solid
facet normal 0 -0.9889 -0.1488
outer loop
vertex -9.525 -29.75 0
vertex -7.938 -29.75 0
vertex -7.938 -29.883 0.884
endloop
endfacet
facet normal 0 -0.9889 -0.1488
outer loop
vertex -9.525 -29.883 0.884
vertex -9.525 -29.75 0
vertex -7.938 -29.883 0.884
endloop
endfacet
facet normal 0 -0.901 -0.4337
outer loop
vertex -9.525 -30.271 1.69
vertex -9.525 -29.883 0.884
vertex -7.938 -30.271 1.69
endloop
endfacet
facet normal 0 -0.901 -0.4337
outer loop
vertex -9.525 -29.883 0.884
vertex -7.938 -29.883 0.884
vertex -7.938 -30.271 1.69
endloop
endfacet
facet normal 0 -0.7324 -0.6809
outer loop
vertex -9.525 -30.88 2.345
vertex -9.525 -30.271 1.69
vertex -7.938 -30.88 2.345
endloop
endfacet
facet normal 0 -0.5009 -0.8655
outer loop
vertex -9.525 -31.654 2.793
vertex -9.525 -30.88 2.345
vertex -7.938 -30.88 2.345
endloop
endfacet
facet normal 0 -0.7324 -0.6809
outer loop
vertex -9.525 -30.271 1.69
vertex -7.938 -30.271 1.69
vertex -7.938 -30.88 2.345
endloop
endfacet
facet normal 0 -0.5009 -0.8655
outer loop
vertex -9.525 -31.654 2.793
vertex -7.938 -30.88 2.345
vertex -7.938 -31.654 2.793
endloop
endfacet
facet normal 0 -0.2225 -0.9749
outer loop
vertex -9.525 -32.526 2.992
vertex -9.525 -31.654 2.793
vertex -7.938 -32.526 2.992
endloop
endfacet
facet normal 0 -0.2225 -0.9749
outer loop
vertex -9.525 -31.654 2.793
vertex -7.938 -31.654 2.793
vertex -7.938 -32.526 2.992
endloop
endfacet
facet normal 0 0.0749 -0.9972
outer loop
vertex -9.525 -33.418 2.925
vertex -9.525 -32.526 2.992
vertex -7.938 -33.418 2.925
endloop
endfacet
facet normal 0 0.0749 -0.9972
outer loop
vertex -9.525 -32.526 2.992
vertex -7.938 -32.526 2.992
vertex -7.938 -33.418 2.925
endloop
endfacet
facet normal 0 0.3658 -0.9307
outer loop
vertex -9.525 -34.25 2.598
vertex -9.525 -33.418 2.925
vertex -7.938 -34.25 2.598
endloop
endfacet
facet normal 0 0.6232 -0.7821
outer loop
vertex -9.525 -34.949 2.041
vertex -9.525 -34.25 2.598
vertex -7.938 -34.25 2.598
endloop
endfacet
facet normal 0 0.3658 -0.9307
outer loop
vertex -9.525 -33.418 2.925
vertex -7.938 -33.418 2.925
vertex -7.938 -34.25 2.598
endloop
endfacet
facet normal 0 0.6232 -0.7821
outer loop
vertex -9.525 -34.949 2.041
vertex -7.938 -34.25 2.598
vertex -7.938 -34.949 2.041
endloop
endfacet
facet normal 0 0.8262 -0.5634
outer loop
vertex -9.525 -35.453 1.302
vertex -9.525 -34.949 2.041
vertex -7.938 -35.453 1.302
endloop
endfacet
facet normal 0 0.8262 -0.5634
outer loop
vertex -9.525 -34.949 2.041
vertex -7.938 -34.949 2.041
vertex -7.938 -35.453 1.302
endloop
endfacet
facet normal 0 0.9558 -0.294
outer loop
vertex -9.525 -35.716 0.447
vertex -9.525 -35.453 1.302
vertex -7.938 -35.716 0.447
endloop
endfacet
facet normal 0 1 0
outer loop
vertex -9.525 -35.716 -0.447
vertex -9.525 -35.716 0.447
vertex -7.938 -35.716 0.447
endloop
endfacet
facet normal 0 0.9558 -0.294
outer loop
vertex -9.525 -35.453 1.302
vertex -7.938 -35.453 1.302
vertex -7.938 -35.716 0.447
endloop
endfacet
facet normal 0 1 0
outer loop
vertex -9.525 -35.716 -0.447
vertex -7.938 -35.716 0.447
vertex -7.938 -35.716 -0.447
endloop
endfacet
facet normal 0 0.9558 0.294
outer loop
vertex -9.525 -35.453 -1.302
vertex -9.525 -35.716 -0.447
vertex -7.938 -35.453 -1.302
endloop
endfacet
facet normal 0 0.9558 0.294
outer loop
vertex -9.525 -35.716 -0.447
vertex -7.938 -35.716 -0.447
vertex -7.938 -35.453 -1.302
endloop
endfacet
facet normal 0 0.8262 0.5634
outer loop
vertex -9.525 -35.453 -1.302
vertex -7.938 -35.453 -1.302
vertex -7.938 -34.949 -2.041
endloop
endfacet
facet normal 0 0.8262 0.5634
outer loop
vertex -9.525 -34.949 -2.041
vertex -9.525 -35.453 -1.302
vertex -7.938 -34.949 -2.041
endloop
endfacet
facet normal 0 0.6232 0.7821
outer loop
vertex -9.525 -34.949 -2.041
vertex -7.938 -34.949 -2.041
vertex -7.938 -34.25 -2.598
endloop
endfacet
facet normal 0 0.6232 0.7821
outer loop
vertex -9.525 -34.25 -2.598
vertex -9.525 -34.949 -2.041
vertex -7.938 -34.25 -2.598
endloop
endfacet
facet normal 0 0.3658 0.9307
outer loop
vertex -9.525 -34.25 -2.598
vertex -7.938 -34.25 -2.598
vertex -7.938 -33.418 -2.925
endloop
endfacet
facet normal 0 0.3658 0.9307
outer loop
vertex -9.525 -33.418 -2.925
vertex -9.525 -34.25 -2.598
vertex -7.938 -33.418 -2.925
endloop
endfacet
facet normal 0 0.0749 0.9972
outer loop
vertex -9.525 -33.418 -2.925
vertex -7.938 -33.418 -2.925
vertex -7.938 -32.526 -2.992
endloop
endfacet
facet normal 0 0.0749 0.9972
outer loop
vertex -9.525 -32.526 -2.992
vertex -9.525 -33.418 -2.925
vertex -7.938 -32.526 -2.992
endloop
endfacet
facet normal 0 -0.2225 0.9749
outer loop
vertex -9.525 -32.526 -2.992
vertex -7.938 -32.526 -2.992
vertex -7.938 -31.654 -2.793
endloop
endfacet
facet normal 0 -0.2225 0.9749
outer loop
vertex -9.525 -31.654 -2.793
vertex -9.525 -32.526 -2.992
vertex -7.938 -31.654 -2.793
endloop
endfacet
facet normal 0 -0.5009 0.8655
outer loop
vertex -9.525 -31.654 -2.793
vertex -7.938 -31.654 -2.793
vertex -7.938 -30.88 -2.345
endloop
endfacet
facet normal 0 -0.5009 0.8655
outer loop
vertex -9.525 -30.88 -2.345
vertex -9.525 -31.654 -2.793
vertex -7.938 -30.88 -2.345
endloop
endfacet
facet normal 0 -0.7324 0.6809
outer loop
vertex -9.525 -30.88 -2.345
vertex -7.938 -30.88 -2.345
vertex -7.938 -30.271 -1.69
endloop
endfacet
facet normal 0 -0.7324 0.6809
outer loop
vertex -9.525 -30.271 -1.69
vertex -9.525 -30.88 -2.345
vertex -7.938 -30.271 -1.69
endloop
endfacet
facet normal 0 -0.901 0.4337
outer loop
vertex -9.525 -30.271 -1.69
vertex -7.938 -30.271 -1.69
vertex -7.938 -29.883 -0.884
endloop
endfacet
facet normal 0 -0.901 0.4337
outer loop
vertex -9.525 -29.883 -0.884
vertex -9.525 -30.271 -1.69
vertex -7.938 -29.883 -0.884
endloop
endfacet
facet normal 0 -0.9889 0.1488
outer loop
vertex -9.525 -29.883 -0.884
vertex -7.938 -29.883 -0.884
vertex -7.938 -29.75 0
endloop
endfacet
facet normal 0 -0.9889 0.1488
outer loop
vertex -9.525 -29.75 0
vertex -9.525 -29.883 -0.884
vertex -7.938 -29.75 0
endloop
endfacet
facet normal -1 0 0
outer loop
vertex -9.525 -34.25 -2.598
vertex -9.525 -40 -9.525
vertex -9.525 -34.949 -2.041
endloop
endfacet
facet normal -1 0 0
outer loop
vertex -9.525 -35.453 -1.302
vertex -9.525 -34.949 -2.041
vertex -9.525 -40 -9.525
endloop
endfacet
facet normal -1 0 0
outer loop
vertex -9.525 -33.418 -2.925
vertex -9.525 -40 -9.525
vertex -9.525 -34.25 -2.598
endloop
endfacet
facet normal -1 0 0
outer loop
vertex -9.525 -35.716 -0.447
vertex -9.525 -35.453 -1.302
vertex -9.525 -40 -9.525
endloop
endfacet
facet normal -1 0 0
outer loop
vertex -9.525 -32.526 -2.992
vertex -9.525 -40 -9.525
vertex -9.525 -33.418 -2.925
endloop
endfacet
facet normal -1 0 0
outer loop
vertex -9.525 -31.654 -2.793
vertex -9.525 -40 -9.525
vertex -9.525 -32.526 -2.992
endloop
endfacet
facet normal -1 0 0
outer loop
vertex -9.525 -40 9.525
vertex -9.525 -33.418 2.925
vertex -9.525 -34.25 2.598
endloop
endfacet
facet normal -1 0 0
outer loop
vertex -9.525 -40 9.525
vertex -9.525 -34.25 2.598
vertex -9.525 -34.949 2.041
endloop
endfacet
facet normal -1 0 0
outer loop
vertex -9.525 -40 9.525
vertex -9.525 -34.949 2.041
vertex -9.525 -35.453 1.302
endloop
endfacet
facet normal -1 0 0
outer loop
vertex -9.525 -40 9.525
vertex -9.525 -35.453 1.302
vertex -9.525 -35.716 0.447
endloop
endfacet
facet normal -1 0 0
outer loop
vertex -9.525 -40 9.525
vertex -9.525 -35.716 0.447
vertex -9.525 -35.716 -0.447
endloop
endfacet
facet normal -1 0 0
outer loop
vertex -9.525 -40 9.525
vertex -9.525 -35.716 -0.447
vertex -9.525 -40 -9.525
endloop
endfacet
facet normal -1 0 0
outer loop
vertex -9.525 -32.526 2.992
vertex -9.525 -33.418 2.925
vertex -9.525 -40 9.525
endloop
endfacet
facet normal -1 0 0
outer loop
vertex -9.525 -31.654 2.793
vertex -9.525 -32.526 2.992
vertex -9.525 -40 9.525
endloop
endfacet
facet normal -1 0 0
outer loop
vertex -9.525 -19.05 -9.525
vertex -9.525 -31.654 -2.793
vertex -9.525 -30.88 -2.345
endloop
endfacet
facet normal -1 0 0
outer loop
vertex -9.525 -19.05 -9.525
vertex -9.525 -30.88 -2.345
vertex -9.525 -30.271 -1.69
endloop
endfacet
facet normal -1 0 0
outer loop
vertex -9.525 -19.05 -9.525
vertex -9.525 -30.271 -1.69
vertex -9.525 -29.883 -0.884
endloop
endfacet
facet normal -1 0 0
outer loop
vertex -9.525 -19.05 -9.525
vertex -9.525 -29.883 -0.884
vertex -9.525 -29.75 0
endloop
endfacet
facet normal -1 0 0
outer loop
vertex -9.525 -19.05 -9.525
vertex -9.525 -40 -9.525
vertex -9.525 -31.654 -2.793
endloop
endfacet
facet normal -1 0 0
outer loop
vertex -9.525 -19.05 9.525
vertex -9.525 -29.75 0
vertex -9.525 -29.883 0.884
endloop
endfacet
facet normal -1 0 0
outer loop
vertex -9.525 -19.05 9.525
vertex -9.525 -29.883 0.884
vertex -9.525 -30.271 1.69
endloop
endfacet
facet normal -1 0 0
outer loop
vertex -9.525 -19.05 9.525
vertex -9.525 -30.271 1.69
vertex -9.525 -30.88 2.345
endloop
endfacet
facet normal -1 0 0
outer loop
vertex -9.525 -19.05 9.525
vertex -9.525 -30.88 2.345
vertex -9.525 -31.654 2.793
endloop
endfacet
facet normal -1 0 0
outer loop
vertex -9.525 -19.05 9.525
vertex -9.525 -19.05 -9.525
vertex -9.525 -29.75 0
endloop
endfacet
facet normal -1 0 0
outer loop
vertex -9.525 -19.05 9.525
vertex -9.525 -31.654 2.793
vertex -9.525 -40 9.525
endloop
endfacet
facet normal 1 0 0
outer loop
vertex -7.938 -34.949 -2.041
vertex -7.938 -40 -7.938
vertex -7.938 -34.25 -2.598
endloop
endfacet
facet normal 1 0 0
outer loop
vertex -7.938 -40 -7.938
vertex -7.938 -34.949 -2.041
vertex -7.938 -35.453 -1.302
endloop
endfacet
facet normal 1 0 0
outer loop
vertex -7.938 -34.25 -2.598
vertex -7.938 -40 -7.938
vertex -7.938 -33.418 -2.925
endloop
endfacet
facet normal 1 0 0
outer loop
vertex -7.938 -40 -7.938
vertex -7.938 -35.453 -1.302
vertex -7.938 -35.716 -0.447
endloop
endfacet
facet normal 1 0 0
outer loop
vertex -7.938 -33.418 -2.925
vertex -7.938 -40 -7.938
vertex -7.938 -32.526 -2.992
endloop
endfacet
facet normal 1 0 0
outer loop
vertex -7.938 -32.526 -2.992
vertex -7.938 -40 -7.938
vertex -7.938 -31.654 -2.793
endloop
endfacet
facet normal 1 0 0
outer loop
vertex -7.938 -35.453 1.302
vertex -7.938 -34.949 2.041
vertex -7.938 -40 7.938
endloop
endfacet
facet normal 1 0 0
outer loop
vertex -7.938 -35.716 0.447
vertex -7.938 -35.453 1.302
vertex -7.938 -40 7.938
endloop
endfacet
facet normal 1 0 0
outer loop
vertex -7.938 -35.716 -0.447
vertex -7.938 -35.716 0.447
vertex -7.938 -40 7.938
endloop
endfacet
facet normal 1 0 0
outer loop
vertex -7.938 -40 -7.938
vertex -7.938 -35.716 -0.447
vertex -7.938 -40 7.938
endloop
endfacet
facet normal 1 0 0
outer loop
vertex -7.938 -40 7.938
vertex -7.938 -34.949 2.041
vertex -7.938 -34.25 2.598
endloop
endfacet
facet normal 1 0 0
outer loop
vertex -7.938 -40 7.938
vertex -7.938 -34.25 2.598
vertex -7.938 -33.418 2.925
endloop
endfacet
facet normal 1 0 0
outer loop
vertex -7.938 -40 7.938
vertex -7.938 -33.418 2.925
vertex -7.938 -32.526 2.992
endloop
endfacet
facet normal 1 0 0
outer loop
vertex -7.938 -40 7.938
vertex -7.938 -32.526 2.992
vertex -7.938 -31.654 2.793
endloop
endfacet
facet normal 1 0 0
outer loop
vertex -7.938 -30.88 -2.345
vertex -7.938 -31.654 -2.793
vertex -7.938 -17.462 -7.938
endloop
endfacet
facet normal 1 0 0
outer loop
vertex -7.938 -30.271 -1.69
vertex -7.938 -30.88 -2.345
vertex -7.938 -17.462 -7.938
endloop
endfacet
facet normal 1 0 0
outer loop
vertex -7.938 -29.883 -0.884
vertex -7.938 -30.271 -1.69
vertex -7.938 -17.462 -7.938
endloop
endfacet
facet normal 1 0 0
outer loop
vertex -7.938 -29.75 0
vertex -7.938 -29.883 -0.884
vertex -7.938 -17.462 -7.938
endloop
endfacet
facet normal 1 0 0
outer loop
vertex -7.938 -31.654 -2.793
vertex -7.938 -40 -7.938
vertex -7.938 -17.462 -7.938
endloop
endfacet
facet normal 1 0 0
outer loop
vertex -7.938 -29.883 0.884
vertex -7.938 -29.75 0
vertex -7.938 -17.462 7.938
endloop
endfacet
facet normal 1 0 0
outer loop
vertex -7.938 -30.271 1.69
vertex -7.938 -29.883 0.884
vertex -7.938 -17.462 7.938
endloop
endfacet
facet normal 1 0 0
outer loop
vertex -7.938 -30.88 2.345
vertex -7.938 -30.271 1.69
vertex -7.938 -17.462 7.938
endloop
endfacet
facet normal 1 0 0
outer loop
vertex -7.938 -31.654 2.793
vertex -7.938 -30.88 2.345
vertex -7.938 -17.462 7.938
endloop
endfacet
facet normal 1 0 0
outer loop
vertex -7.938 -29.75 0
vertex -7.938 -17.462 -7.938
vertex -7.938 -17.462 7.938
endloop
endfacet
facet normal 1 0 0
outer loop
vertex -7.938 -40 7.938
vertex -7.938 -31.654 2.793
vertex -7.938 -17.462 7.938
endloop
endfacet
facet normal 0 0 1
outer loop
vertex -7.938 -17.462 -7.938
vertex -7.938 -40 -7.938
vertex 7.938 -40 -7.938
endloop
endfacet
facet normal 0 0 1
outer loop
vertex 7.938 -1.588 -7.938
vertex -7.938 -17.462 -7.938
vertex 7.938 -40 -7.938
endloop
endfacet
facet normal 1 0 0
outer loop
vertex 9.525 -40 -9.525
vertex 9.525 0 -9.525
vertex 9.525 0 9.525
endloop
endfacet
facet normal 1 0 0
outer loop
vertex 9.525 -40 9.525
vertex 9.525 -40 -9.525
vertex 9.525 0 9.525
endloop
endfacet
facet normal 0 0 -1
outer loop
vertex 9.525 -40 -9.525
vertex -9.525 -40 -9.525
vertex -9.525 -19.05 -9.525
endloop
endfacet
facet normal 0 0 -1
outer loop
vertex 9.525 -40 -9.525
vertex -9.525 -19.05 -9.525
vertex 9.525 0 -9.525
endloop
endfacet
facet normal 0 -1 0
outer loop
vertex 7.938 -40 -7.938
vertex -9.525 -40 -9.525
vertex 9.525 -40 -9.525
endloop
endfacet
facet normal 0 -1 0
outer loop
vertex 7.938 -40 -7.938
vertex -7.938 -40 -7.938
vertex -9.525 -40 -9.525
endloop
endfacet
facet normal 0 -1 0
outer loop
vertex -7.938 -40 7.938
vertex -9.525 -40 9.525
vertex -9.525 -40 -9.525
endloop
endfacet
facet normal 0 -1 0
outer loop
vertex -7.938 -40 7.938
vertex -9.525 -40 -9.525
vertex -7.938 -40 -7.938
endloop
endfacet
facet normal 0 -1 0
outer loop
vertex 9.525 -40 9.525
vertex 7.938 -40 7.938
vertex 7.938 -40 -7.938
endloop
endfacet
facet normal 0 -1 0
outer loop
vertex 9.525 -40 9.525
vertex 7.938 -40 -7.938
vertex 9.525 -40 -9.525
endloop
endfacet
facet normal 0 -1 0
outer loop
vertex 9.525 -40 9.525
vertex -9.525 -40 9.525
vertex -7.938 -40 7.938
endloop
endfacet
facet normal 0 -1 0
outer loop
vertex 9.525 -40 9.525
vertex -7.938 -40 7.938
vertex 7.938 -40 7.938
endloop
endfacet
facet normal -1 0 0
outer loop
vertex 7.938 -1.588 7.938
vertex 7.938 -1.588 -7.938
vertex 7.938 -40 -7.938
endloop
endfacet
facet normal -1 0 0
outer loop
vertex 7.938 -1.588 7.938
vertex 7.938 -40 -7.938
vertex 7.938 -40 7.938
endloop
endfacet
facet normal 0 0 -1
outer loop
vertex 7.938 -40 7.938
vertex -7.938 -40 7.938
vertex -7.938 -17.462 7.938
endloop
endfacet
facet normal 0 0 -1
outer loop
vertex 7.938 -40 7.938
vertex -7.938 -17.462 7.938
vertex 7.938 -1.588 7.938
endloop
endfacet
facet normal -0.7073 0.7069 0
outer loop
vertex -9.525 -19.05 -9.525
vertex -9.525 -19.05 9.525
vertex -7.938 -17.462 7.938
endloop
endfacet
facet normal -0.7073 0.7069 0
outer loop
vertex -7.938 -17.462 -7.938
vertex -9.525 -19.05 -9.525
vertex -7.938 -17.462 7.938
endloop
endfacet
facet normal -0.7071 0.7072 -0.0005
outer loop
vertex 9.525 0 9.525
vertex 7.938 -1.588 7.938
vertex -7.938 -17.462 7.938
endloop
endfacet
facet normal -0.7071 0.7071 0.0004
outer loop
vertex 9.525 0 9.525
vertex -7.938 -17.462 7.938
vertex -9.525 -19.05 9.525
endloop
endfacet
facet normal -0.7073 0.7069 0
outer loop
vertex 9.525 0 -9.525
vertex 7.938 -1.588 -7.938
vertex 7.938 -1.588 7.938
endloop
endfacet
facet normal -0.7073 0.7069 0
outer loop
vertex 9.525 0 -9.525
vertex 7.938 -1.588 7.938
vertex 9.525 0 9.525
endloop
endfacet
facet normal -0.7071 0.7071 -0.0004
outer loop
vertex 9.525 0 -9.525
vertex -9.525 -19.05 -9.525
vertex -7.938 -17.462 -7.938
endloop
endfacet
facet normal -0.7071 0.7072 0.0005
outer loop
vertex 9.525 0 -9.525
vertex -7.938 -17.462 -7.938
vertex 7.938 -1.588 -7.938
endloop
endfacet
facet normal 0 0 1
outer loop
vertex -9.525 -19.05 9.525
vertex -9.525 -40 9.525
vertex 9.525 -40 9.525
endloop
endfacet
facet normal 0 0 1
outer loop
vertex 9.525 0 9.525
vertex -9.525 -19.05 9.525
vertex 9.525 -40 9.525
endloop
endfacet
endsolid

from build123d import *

# Parameters (mm, degrees)
F0_W     = 19.05
F0_H     = 19.05
F0_W_2   = 15.875
F0_H_2   = 15.875
F1_DEPTH = 40
F3_DEPTH = 9.526
F4_DEPTH = 9.526
F5_R     = 3
F6_DEPTH = 9.526


with BuildPart() as f1:
    # F0 (on Front) → F1 (new body)
    with BuildSketch(Plane.XZ):
        Rectangle(F0_W, F0_H)
        Rectangle(F0_W_2, F0_H_2, mode=Mode.SUBTRACT)
    extrude(amount=F1_DEPTH)

    # F2 (on Top) → F3 (cut, through all)
    with BuildSketch(Plane.XY):
        Polygon((9.525, 0), (-9.525, 0), (-9.525, -19.05), align=None)
    extrude(amount=-F3_DEPTH, mode=Mode.SUBTRACT)

    # F2 (on Top) → F4 (cut, through all)
    with BuildSketch(Plane.XY):
        Polygon((9.525, 0), (-9.525, 0), (-9.525, -19.05), align=None)
    extrude(amount=F4_DEPTH, mode=Mode.SUBTRACT)

    # F5 (on Right) → F6 (cut, through all)
    with BuildSketch(Plane.YZ):
        with Locations((-32.75, 0)):
            Circle(F5_R)
    extrude(amount=-F6_DEPTH, mode=Mode.SUBTRACT)


solid = f1.part
